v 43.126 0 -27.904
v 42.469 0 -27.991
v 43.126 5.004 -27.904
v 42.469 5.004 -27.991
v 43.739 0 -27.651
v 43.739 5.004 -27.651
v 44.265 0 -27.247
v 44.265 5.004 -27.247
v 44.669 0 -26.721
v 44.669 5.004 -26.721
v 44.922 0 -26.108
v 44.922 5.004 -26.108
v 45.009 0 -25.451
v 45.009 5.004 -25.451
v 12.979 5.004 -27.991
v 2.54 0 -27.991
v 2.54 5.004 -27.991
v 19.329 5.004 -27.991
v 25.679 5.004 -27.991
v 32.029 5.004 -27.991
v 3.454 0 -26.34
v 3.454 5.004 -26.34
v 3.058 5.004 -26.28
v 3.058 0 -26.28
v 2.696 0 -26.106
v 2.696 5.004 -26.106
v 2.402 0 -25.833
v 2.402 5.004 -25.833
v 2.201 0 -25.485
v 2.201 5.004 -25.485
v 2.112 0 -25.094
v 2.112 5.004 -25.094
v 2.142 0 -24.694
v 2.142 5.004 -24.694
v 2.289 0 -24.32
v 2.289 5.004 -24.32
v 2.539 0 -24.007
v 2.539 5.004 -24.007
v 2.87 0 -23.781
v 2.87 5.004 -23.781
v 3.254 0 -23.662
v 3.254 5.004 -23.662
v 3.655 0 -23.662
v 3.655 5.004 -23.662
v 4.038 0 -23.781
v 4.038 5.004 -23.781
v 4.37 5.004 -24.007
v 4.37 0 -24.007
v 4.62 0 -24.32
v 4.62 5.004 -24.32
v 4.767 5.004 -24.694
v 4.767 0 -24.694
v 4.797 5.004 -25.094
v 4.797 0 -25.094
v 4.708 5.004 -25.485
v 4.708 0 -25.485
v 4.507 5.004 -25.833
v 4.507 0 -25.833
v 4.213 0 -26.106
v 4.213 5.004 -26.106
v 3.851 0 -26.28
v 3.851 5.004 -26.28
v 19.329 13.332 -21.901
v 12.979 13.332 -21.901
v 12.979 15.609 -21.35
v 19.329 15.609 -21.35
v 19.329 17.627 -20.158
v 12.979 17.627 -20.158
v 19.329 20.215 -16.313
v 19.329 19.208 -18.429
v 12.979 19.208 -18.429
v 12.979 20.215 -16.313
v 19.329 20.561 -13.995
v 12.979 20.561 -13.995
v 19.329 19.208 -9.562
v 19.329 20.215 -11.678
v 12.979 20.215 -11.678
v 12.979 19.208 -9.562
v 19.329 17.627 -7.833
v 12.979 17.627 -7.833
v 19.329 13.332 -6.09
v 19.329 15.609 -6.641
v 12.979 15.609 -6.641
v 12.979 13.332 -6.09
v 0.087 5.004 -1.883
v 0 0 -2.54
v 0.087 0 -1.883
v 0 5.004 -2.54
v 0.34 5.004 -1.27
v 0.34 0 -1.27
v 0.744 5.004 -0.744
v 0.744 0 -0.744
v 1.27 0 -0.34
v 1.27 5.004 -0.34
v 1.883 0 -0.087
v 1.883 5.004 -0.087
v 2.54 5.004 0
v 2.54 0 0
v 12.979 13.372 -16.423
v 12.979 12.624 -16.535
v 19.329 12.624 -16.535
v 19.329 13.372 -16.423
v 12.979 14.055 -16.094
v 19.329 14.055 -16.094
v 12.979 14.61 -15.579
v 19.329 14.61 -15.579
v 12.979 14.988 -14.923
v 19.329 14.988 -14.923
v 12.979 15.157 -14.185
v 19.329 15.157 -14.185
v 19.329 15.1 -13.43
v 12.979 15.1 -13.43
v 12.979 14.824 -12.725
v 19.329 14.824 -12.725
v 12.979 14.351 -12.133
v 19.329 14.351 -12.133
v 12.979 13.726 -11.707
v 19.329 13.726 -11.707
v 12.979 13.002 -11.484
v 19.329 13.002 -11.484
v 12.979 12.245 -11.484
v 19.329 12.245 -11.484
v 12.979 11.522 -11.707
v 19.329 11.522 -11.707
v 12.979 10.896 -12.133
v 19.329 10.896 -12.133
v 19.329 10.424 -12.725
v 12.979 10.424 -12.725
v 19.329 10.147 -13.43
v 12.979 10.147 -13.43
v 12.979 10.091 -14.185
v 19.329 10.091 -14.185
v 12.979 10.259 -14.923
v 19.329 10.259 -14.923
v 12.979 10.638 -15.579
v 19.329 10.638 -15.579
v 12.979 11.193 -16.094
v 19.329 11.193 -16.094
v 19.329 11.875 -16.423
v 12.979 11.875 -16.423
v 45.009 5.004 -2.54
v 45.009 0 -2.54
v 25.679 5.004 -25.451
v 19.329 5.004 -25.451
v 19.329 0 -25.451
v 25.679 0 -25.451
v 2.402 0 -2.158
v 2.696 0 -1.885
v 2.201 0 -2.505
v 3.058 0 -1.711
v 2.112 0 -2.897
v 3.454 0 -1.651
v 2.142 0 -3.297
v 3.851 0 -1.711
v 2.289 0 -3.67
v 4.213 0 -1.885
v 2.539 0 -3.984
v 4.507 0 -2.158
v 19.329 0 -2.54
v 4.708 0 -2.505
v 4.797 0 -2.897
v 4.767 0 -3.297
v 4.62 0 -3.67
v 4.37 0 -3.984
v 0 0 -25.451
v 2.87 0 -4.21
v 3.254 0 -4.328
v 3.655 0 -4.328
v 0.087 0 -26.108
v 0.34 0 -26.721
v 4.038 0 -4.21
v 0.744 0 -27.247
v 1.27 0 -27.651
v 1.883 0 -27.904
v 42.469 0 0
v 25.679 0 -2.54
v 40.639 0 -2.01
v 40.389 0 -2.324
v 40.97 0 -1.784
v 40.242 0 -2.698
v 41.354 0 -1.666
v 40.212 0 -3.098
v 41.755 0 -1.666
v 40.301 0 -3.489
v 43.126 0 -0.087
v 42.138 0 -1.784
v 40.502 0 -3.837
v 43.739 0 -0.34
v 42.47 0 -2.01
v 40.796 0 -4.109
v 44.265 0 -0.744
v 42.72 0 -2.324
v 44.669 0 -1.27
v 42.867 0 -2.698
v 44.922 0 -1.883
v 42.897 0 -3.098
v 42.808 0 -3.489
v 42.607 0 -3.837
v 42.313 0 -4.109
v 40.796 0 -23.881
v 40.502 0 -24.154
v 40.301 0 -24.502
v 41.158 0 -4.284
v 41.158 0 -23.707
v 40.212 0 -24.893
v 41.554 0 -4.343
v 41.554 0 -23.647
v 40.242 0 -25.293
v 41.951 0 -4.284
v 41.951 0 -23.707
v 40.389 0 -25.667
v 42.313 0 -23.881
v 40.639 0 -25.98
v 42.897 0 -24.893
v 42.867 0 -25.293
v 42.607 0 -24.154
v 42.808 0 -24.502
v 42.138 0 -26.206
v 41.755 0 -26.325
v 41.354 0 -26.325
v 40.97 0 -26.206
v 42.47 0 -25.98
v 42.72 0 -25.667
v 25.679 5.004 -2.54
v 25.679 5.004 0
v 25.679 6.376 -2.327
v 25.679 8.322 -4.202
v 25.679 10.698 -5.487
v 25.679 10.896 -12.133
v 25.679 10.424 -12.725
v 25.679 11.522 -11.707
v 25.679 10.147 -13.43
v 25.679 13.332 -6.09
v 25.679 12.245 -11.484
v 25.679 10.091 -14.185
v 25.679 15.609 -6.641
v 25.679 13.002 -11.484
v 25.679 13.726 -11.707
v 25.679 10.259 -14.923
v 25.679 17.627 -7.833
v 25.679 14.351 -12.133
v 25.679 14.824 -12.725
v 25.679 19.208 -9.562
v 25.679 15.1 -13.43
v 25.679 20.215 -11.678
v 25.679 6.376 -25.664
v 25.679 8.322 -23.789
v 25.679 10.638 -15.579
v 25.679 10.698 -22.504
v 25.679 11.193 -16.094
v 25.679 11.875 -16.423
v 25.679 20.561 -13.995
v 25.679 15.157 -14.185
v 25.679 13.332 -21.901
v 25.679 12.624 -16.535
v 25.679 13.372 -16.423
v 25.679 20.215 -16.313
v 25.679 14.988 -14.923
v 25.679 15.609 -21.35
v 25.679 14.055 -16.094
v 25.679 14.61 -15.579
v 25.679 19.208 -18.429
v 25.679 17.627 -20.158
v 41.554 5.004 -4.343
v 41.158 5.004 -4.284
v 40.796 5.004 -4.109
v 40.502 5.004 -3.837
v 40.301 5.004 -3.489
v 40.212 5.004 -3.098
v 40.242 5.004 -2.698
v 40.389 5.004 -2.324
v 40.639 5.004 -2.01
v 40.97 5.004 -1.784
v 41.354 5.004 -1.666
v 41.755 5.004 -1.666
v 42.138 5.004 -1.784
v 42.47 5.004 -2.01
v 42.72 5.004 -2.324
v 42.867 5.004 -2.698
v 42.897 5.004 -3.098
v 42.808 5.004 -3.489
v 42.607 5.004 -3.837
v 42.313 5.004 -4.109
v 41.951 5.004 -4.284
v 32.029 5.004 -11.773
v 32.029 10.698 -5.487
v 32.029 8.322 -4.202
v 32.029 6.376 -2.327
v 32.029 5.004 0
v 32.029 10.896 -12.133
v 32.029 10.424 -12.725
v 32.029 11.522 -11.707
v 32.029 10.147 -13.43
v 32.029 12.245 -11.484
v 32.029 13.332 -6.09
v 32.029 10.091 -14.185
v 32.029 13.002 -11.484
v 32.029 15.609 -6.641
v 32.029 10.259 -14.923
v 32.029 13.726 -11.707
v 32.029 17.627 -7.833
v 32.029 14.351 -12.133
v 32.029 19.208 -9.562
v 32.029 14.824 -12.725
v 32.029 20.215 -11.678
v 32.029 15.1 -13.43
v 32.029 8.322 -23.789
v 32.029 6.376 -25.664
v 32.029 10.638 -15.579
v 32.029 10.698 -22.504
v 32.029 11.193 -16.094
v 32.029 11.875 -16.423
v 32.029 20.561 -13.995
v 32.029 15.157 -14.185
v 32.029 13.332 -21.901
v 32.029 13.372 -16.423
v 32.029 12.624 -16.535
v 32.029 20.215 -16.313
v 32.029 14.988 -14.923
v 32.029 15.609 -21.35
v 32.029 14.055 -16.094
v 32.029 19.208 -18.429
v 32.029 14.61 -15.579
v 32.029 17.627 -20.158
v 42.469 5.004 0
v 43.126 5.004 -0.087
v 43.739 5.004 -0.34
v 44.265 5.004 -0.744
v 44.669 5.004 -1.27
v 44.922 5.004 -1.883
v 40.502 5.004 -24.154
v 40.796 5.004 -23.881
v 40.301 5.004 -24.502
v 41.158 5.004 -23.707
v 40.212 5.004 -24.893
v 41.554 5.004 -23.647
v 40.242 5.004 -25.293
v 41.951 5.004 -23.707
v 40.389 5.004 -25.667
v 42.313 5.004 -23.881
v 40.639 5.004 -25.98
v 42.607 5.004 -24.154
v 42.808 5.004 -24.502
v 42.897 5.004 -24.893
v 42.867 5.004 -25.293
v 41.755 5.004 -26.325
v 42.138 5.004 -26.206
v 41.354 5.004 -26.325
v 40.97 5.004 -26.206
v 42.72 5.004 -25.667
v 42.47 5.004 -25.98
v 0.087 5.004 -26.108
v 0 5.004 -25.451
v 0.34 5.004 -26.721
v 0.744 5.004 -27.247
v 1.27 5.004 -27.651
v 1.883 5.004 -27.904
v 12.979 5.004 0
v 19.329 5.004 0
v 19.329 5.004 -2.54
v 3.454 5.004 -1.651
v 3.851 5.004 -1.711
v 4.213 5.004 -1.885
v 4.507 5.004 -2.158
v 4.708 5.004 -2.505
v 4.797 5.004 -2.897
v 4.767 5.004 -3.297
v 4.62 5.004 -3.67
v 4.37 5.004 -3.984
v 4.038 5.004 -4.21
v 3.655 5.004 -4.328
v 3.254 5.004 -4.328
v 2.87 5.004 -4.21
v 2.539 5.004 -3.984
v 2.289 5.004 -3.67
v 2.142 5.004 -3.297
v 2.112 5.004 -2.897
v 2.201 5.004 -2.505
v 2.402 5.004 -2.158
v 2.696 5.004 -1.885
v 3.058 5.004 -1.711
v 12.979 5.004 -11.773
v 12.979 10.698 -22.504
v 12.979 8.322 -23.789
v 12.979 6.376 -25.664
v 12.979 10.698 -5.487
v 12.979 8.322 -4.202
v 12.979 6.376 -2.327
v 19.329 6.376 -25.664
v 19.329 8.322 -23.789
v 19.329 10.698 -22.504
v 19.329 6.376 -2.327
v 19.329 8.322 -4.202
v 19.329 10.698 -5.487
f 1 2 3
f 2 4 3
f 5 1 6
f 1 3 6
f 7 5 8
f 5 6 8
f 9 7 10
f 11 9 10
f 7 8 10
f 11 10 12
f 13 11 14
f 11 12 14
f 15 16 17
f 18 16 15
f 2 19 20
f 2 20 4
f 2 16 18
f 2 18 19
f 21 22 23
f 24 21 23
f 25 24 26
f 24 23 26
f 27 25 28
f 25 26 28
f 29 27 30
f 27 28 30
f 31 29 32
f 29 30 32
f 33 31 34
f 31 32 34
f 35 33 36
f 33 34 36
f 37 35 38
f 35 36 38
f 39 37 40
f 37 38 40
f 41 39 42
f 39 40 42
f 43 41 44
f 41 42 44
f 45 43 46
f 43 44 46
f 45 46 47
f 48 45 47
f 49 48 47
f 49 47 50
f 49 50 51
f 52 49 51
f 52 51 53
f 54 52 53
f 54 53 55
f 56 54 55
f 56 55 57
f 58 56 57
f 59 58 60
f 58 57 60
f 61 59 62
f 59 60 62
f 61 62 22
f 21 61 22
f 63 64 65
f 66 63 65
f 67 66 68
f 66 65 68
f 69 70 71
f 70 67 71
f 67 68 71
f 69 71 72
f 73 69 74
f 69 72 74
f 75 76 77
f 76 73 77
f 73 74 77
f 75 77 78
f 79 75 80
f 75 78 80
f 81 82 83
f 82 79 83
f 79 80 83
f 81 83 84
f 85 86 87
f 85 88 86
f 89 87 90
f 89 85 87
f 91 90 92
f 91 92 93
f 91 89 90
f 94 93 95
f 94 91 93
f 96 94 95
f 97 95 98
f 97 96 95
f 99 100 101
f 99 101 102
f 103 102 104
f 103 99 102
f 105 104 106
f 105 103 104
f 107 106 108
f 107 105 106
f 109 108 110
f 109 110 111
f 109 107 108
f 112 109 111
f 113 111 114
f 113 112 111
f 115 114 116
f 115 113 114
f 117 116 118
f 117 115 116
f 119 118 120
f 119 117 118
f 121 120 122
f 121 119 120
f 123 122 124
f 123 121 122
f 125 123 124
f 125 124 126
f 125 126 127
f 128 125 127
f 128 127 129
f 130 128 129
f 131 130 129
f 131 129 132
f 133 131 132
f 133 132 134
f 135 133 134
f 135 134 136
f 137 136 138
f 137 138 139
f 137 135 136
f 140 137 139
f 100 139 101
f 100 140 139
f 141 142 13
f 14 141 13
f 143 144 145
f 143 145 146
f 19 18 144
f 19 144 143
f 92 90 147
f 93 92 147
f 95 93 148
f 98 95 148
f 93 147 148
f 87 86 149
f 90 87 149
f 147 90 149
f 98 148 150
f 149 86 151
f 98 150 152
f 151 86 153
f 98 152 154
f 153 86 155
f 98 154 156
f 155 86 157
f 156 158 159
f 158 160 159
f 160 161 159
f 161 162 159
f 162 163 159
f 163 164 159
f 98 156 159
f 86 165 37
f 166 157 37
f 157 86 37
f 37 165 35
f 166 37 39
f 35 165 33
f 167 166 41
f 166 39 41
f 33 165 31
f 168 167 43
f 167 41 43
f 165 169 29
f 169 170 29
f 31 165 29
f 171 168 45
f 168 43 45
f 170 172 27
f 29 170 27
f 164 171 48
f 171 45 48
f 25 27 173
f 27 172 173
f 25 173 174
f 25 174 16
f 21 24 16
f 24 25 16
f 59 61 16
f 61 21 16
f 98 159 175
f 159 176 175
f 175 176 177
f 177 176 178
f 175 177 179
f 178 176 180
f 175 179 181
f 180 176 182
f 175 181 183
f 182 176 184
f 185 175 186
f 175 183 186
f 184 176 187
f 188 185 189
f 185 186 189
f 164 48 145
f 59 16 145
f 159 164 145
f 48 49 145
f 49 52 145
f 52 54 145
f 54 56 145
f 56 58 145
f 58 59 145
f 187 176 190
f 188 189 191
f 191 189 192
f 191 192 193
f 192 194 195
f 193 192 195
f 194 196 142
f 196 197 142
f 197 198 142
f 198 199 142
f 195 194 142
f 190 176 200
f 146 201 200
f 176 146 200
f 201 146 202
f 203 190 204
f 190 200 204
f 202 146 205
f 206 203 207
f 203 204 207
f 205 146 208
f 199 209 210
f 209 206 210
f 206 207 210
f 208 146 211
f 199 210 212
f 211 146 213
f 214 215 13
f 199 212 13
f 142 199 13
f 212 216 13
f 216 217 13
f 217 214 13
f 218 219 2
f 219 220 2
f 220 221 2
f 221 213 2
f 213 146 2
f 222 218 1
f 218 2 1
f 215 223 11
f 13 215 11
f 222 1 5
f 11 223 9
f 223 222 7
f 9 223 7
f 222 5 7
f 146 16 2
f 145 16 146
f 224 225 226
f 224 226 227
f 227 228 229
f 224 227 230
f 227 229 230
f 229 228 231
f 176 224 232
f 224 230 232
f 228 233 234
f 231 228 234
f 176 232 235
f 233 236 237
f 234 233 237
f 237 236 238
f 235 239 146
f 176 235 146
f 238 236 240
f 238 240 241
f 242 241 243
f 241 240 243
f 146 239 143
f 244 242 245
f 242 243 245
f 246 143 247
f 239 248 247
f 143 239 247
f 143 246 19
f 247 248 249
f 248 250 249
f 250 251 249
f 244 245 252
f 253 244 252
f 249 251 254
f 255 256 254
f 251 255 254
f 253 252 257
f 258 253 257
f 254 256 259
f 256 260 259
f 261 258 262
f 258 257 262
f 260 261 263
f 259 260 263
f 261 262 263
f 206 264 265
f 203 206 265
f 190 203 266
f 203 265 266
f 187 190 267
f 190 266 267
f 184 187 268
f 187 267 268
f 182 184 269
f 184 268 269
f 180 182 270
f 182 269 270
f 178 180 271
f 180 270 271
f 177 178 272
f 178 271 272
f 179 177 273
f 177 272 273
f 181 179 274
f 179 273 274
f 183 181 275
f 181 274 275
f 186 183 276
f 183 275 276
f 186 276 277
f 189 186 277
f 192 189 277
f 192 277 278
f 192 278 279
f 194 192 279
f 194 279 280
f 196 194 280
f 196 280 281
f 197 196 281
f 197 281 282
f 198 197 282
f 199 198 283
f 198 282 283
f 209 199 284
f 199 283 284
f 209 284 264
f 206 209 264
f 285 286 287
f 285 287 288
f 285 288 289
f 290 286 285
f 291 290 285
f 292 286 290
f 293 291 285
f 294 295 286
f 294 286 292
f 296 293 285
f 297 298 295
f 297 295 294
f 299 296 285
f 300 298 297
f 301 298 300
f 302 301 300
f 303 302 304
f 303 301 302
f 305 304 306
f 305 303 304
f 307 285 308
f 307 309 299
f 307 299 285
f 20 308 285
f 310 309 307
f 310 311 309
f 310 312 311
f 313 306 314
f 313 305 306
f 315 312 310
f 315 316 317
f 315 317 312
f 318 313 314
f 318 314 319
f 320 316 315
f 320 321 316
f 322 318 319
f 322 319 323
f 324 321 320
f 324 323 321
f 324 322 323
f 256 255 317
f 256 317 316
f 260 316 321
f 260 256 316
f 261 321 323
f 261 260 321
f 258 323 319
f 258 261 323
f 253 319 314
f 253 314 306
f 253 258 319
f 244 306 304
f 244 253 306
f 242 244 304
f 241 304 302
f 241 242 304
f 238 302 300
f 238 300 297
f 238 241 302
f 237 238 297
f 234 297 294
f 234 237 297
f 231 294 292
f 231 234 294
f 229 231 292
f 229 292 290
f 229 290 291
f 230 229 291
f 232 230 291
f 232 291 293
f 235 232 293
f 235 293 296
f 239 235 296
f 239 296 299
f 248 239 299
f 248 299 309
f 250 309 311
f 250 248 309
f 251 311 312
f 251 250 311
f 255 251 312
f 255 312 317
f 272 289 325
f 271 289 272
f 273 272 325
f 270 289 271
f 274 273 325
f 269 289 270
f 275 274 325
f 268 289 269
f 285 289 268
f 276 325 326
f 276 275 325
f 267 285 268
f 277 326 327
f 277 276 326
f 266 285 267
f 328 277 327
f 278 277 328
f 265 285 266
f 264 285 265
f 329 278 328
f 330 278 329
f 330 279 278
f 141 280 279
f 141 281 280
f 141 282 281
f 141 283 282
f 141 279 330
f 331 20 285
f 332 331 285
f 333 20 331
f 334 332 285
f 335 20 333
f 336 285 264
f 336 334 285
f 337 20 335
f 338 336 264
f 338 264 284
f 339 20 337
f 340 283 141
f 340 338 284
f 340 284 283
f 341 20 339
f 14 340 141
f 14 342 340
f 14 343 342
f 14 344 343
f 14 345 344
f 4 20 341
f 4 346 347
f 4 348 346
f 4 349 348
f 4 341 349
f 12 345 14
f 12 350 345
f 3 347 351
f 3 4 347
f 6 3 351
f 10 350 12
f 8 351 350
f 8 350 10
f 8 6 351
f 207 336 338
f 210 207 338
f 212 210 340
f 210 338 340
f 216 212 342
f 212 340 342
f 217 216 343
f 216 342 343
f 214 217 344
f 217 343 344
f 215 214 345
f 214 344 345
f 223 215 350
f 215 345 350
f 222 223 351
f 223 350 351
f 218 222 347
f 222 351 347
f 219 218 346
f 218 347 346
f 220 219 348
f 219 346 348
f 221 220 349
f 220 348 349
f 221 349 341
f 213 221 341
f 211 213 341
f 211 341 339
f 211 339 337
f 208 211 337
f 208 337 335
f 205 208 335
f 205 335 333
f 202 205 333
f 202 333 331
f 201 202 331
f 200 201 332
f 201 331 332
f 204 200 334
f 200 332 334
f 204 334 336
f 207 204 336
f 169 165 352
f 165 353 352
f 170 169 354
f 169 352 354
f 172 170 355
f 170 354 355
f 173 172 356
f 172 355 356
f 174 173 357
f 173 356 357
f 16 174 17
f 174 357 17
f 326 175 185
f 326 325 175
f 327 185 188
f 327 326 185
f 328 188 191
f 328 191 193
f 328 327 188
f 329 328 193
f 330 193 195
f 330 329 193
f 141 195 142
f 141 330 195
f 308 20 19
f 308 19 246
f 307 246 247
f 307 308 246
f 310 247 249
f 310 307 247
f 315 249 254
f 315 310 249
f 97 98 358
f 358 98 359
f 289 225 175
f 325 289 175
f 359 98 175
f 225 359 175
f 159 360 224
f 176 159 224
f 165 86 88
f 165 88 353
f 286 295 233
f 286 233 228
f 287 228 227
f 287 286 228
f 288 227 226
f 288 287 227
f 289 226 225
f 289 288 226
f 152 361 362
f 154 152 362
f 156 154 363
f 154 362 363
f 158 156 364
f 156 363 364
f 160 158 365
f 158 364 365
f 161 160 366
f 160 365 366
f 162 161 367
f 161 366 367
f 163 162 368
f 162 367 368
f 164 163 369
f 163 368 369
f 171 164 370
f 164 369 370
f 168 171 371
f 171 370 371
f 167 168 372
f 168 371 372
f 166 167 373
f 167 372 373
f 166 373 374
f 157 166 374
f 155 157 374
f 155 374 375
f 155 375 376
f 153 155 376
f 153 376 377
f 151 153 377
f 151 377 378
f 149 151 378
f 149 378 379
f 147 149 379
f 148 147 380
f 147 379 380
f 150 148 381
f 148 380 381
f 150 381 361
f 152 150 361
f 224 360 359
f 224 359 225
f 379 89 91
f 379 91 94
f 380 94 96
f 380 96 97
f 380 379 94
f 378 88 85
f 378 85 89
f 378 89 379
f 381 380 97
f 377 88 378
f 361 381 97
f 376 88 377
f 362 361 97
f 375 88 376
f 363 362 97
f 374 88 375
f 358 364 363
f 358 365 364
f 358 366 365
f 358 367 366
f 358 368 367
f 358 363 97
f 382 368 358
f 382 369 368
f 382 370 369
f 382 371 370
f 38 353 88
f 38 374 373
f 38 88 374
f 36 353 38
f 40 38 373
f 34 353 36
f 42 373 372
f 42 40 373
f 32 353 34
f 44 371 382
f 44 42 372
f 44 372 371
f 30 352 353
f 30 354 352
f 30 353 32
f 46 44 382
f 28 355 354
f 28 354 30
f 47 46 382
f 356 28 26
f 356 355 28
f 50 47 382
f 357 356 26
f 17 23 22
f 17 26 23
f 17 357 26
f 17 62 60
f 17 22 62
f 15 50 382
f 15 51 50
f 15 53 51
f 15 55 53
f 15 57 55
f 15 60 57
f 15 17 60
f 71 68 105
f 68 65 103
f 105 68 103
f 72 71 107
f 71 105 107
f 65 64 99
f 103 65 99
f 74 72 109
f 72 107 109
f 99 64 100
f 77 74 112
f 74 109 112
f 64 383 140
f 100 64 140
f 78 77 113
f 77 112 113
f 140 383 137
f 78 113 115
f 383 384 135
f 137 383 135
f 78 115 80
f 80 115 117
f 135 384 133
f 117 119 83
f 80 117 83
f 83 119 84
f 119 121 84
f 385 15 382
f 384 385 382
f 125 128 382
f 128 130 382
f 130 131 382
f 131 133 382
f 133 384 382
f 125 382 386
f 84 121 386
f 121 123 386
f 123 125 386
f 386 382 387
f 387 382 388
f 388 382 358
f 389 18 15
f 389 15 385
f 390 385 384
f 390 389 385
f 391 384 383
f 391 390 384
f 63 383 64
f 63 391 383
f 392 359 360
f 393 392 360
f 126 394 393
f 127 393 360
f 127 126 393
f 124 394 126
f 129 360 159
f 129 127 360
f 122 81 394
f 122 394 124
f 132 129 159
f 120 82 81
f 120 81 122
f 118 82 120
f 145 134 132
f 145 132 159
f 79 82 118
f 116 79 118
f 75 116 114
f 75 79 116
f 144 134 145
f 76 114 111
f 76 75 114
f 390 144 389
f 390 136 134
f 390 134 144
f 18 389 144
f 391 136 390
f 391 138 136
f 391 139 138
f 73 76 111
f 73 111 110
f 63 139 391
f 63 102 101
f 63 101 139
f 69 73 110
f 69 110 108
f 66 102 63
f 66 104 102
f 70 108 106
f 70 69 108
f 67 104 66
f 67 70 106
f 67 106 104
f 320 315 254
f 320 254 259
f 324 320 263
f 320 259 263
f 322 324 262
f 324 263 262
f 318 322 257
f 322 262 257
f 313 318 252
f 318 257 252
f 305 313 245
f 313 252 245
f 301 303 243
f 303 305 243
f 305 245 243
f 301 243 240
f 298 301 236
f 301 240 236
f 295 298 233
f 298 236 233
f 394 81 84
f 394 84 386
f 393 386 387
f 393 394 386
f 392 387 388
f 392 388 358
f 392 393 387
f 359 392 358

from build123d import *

# Parameters (mm, degrees)
SKETCH1_W           = 45.0088
SKETCH1_H           = 27.9908
BOSS_EXTRUDE1_DEPTH = 5.0038
SKETCH2_R           = 1.3462
CUT_EXTRUDE1_DEPTH  = 5.0038
FILLET1_R           = 2.54
BOSS_EXTRUDE2_START = 3.175
SKETCH3_R           = 7.9375
SKETCH3_R_2         = 2.54
BOSS_EXTRUDE2_DEPTH = 6.35
BOSS_EXTRUDE3_START = -9.525
SKETCH4_R           = 7.9375
SKETCH4_R_2         = 2.54
BOSS_EXTRUDE3_DEPTH = 6.35
FILLET2_R           = 10.000000066
SKETCH5_W           = 6.35
SKETCH5_H           = 22.9108
CUT_EXTRUDE2_DEPTH  = 56.238689053


with BuildPart() as part:
    # Sketch1 → Boss-Extrude1 (new body)
    with BuildSketch(Plane(origin=(0, 0, 0), x_dir=(1, 0, 0), z_dir=(0, 1, 0))):
        with Locations((22.5044, 13.9954)):
            Rectangle(SKETCH1_W, SKETCH1_H)
    extrude(amount=BOSS_EXTRUDE1_DEPTH)

    # Sketch2 → Cut-Extrude1 (cut)
    with BuildSketch(Plane(origin=(0, 5.0038, 0), x_dir=(1, 0, 0), z_dir=(0, 1, 0))):
        with Locations(Location((41.5544, 24.9936, 0), (0, 0, 270))):
            Circle(SKETCH2_R)
        with Locations(Location((41.5544, 2.9972, 0), (0, 0, 90))):
            Circle(SKETCH2_R)
        with Locations(Location((3.4544, 24.9936, 0), (0, 0, 90))):
            Circle(SKETCH2_R)
        with Locations(Location((3.4544, 2.9972, 0), (0, 0, 270))):
            Circle(SKETCH2_R)
    extrude(amount=-CUT_EXTRUDE1_DEPTH, mode=Mode.SUBTRACT)

    # Fillet1
    fillet1_edges = [part.edges().sort_by_distance(p)[0] for p in [
        (0, 2.5019, -27.9908),
        (45.0088, 2.5019, -27.9908),
        (45.0088, 2.5019, 0),
        (0, 2.5019, 0),
    ]]
    fillet(fillet1_edges, radius=FILLET1_R)

    # Sketch3 → Boss-Extrude2 (add)
    with BuildSketch(Plane(origin=(22.5044, 0, 0), x_dir=(0, 0, -1), z_dir=(1, 0, 0)).offset(BOSS_EXTRUDE2_START)):
        with Locations((13.9954, 12.6238)):
            Circle(SKETCH3_R)
        with Locations((13.9954, 12.6238)):
            Circle(SKETCH3_R_2, mode=Mode.SUBTRACT)
    extrude(amount=BOSS_EXTRUDE2_DEPTH)

    # Sketch4 → Boss-Extrude3 (add)
    with BuildSketch(Plane(origin=(22.5044, 0, 0), x_dir=(0, 0, -1), z_dir=(1, 0, 0)).offset(BOSS_EXTRUDE3_START)):
        with Locations((13.9954, 12.6238)):
            Circle(SKETCH4_R)
        with Locations((13.9954, 12.6238)):
            Circle(SKETCH4_R_2, mode=Mode.SUBTRACT)
    extrude(amount=BOSS_EXTRUDE3_DEPTH)

    # Fillet2
    # the kernel refuses this fillet: 10.000000066 mm, written as the material it adds along each edge
    with BuildSketch(Plane(origin=(32.0294, 5.0038, -16.2179), x_dir=(0, 0, -1), z_dir=(-1, 0, 0)), Plane(origin=(19.3294, 5.0038, -16.2179), x_dir=(0, 0, -1), z_dir=(-1, 0, 0))) as fillet2_piece_1:
        with BuildLine():
            CenterArc((15.643447864, -9.220567258), FILLET2_R, 112.771363132, 62.10931252)
            Line((5.683337527, -8.328264951), (5.484135321, -8.310418905))
            ThreePointArc((5.484135321, -8.310418905), (4.168656518, -3.258575394), (-0.056, -0.192000001))
            Line((-0.056, -0.192000001), (0, 0.200000001))
            ThreePointArc((0, 0.200000001), (5.88645, 0.200000001), (11.695489043, 0.184411345))
            Line((11.695489043, 0.184411345), (11.7729, 0))
        make_face()
    extrude(amount=6.35)
    with BuildSketch(Plane(origin=(32.0294, 5.0038, -16.2179), x_dir=(0, 0, -1), z_dir=(-1, 0, 0))) as fillet2_piece_2_section:
        with BuildLine():
            CenterArc((15.643447864, -9.220567258), FILLET2_R, 112.771363132, 62.10931252)
            Line((5.683337527, -8.328264951), (5.484135321, -8.310418905))
            ThreePointArc((5.484135321, -8.310418905), (4.168656518, -3.258575394), (-0.056, -0.192000001))
            Line((-0.056, -0.192000001), (0, 0.200000001))
            ThreePointArc((0, 0.200000001), (5.88645, 0.200000001), (11.695489043, 0.184411345))
            Line((11.695489043, 0.184411345), (11.7729, 0))
        make_face()
    fillet2_piece_2 = extrude(amount=35.78225, mode=Mode.PRIVATE)
    fillet2_piece_2 = split(fillet2_piece_2, bisect_by=Plane(origin=(12.9794, 6.888894544, -22.053995201), z_dir=(1, 0, 0)), keep=Keep.TOP, mode=Mode.PRIVATE)
    fillet2_piece_2 = split(fillet2_piece_2, bisect_by=Plane(origin=(19.3294, 6.888894544, -22.053995201), z_dir=(-1, 0, 0)), keep=Keep.TOP, mode=Mode.PRIVATE)
    add(fillet2_piece_2)
    with BuildSketch(Plane(origin=(32.0294, 5.0038, -11.7729), x_dir=(0, 0, 1), z_dir=(-1, 0, 0)), Plane(origin=(19.3294, 5.0038, -11.7729), x_dir=(0, 0, 1), z_dir=(-1, 0, 0))) as fillet2_piece_3:
        with BuildLine():
            CenterArc((15.643447864, 9.220567258), FILLET2_R, 185.119324348, 62.10931252)
            Line((5.683337527, 8.328264951), (5.484135321, 8.310418905))
            ThreePointArc((5.484135321, 8.310418905), (4.168656518, 3.258575394), (-0.056, 0.192000001))
            Line((-0.056, 0.192000001), (0, -0.200000001))
            ThreePointArc((0, -0.200000001), (5.88645, -0.200000001), (11.695489043, -0.184411345))
            Line((11.695489043, -0.184411345), (11.7729, 0))
        make_face()
    extrude(amount=6.35)
    with BuildSketch(Plane(origin=(32.0294, 5.0038, -11.7729), x_dir=(0, 0, 1), z_dir=(-1, 0, 0))) as fillet2_piece_4_section:
        with BuildLine():
            CenterArc((15.643447864, 9.220567258), FILLET2_R, 185.119324348, 62.10931252)
            Line((5.683337527, 8.328264951), (5.484135321, 8.310418905))
            ThreePointArc((5.484135321, 8.310418905), (4.168656518, 3.258575394), (-0.056, 0.192000001))
            Line((-0.056, 0.192000001), (0, -0.200000001))
            ThreePointArc((0, -0.200000001), (5.88645, -0.200000001), (11.695489043, -0.184411345))
            Line((11.695489043, -0.184411345), (11.7729, 0))
        make_face()
    fillet2_piece_4 = extrude(amount=35.78225, mode=Mode.PRIVATE)
    fillet2_piece_4 = split(fillet2_piece_4, bisect_by=Plane(origin=(12.9794, 6.888894544, -5.936804799), z_dir=(1, 0, 0)), keep=Keep.TOP, mode=Mode.PRIVATE)
    fillet2_piece_4 = split(fillet2_piece_4, bisect_by=Plane(origin=(19.3294, 6.888894544, -5.936804799), z_dir=(-1, 0, 0)), keep=Keep.TOP, mode=Mode.PRIVATE)
    add(fillet2_piece_4)
    with BuildSketch(Plane(origin=(48.76165, 5.0038, -11.7729), x_dir=(0, 0, 1), z_dir=(-1, 0, 0))) as fillet2_piece_5_section:
        with BuildLine():
            CenterArc((15.643447864, 9.220567258), FILLET2_R, 185.119324348, 62.10931252)
            Line((5.683337527, 8.328264951), (5.484135321, 8.310418905))
            ThreePointArc((5.484135321, 8.310418905), (4.168656518, 3.258575394), (-0.056, 0.192000001))
            Line((-0.056, 0.192000001), (0, -0.200000001))
            ThreePointArc((0, -0.200000001), (5.88645, -0.200000001), (11.695489043, -0.184411345))
            Line((11.695489043, -0.184411345), (11.7729, 0))
        make_face()
    fillet2_piece_5 = extrude(amount=35.78225, mode=Mode.PRIVATE)
    fillet2_piece_5 = split(fillet2_piece_5, bisect_by=Plane(origin=(25.6794, 6.888894544, -5.936804799), z_dir=(1, 0, 0)), keep=Keep.TOP, mode=Mode.PRIVATE)
    fillet2_piece_5 = split(fillet2_piece_5, bisect_by=Plane(origin=(32.0294, 6.888894544, -5.936804799), z_dir=(-1, 0, 0)), keep=Keep.TOP, mode=Mode.PRIVATE)
    add(fillet2_piece_5)
    with BuildSketch(Plane(origin=(48.76165, 5.0038, -16.2179), x_dir=(0, 0, -1), z_dir=(-1, 0, 0))) as fillet2_piece_6_section:
        with BuildLine():
            CenterArc((15.643447864, -9.220567258), FILLET2_R, 112.771363132, 62.10931252)
            Line((5.683337527, -8.328264951), (5.484135321, -8.310418905))
            ThreePointArc((5.484135321, -8.310418905), (4.168656518, -3.258575394), (-0.056, -0.192000001))
            Line((-0.056, -0.192000001), (0, 0.200000001))
            ThreePointArc((0, 0.200000001), (5.88645, 0.200000001), (11.695489043, 0.184411345))
            Line((11.695489043, 0.184411345), (11.7729, 0))
        make_face()
    fillet2_piece_6 = extrude(amount=35.78225, mode=Mode.PRIVATE)
    fillet2_piece_6 = split(fillet2_piece_6, bisect_by=Plane(origin=(25.6794, 6.888894544, -22.053995201), z_dir=(1, 0, 0)), keep=Keep.TOP, mode=Mode.PRIVATE)
    fillet2_piece_6 = split(fillet2_piece_6, bisect_by=Plane(origin=(32.0294, 6.888894544, -22.053995201), z_dir=(-1, 0, 0)), keep=Keep.TOP, mode=Mode.PRIVATE)
    add(fillet2_piece_6)

    # Sketch5 → Cut-Extrude2 (cut, through all)
    with BuildSketch(Plane(origin=(0, 5.0038, 0), x_dir=(1, 0, 0), z_dir=(0, 1, 0))):
        with Locations((22.5044, 13.9954)):
            Rectangle(SKETCH5_W, SKETCH5_H)
    extrude(amount=-CUT_EXTRUDE2_DEPTH, mode=Mode.SUBTRACT)


solid = part.part
